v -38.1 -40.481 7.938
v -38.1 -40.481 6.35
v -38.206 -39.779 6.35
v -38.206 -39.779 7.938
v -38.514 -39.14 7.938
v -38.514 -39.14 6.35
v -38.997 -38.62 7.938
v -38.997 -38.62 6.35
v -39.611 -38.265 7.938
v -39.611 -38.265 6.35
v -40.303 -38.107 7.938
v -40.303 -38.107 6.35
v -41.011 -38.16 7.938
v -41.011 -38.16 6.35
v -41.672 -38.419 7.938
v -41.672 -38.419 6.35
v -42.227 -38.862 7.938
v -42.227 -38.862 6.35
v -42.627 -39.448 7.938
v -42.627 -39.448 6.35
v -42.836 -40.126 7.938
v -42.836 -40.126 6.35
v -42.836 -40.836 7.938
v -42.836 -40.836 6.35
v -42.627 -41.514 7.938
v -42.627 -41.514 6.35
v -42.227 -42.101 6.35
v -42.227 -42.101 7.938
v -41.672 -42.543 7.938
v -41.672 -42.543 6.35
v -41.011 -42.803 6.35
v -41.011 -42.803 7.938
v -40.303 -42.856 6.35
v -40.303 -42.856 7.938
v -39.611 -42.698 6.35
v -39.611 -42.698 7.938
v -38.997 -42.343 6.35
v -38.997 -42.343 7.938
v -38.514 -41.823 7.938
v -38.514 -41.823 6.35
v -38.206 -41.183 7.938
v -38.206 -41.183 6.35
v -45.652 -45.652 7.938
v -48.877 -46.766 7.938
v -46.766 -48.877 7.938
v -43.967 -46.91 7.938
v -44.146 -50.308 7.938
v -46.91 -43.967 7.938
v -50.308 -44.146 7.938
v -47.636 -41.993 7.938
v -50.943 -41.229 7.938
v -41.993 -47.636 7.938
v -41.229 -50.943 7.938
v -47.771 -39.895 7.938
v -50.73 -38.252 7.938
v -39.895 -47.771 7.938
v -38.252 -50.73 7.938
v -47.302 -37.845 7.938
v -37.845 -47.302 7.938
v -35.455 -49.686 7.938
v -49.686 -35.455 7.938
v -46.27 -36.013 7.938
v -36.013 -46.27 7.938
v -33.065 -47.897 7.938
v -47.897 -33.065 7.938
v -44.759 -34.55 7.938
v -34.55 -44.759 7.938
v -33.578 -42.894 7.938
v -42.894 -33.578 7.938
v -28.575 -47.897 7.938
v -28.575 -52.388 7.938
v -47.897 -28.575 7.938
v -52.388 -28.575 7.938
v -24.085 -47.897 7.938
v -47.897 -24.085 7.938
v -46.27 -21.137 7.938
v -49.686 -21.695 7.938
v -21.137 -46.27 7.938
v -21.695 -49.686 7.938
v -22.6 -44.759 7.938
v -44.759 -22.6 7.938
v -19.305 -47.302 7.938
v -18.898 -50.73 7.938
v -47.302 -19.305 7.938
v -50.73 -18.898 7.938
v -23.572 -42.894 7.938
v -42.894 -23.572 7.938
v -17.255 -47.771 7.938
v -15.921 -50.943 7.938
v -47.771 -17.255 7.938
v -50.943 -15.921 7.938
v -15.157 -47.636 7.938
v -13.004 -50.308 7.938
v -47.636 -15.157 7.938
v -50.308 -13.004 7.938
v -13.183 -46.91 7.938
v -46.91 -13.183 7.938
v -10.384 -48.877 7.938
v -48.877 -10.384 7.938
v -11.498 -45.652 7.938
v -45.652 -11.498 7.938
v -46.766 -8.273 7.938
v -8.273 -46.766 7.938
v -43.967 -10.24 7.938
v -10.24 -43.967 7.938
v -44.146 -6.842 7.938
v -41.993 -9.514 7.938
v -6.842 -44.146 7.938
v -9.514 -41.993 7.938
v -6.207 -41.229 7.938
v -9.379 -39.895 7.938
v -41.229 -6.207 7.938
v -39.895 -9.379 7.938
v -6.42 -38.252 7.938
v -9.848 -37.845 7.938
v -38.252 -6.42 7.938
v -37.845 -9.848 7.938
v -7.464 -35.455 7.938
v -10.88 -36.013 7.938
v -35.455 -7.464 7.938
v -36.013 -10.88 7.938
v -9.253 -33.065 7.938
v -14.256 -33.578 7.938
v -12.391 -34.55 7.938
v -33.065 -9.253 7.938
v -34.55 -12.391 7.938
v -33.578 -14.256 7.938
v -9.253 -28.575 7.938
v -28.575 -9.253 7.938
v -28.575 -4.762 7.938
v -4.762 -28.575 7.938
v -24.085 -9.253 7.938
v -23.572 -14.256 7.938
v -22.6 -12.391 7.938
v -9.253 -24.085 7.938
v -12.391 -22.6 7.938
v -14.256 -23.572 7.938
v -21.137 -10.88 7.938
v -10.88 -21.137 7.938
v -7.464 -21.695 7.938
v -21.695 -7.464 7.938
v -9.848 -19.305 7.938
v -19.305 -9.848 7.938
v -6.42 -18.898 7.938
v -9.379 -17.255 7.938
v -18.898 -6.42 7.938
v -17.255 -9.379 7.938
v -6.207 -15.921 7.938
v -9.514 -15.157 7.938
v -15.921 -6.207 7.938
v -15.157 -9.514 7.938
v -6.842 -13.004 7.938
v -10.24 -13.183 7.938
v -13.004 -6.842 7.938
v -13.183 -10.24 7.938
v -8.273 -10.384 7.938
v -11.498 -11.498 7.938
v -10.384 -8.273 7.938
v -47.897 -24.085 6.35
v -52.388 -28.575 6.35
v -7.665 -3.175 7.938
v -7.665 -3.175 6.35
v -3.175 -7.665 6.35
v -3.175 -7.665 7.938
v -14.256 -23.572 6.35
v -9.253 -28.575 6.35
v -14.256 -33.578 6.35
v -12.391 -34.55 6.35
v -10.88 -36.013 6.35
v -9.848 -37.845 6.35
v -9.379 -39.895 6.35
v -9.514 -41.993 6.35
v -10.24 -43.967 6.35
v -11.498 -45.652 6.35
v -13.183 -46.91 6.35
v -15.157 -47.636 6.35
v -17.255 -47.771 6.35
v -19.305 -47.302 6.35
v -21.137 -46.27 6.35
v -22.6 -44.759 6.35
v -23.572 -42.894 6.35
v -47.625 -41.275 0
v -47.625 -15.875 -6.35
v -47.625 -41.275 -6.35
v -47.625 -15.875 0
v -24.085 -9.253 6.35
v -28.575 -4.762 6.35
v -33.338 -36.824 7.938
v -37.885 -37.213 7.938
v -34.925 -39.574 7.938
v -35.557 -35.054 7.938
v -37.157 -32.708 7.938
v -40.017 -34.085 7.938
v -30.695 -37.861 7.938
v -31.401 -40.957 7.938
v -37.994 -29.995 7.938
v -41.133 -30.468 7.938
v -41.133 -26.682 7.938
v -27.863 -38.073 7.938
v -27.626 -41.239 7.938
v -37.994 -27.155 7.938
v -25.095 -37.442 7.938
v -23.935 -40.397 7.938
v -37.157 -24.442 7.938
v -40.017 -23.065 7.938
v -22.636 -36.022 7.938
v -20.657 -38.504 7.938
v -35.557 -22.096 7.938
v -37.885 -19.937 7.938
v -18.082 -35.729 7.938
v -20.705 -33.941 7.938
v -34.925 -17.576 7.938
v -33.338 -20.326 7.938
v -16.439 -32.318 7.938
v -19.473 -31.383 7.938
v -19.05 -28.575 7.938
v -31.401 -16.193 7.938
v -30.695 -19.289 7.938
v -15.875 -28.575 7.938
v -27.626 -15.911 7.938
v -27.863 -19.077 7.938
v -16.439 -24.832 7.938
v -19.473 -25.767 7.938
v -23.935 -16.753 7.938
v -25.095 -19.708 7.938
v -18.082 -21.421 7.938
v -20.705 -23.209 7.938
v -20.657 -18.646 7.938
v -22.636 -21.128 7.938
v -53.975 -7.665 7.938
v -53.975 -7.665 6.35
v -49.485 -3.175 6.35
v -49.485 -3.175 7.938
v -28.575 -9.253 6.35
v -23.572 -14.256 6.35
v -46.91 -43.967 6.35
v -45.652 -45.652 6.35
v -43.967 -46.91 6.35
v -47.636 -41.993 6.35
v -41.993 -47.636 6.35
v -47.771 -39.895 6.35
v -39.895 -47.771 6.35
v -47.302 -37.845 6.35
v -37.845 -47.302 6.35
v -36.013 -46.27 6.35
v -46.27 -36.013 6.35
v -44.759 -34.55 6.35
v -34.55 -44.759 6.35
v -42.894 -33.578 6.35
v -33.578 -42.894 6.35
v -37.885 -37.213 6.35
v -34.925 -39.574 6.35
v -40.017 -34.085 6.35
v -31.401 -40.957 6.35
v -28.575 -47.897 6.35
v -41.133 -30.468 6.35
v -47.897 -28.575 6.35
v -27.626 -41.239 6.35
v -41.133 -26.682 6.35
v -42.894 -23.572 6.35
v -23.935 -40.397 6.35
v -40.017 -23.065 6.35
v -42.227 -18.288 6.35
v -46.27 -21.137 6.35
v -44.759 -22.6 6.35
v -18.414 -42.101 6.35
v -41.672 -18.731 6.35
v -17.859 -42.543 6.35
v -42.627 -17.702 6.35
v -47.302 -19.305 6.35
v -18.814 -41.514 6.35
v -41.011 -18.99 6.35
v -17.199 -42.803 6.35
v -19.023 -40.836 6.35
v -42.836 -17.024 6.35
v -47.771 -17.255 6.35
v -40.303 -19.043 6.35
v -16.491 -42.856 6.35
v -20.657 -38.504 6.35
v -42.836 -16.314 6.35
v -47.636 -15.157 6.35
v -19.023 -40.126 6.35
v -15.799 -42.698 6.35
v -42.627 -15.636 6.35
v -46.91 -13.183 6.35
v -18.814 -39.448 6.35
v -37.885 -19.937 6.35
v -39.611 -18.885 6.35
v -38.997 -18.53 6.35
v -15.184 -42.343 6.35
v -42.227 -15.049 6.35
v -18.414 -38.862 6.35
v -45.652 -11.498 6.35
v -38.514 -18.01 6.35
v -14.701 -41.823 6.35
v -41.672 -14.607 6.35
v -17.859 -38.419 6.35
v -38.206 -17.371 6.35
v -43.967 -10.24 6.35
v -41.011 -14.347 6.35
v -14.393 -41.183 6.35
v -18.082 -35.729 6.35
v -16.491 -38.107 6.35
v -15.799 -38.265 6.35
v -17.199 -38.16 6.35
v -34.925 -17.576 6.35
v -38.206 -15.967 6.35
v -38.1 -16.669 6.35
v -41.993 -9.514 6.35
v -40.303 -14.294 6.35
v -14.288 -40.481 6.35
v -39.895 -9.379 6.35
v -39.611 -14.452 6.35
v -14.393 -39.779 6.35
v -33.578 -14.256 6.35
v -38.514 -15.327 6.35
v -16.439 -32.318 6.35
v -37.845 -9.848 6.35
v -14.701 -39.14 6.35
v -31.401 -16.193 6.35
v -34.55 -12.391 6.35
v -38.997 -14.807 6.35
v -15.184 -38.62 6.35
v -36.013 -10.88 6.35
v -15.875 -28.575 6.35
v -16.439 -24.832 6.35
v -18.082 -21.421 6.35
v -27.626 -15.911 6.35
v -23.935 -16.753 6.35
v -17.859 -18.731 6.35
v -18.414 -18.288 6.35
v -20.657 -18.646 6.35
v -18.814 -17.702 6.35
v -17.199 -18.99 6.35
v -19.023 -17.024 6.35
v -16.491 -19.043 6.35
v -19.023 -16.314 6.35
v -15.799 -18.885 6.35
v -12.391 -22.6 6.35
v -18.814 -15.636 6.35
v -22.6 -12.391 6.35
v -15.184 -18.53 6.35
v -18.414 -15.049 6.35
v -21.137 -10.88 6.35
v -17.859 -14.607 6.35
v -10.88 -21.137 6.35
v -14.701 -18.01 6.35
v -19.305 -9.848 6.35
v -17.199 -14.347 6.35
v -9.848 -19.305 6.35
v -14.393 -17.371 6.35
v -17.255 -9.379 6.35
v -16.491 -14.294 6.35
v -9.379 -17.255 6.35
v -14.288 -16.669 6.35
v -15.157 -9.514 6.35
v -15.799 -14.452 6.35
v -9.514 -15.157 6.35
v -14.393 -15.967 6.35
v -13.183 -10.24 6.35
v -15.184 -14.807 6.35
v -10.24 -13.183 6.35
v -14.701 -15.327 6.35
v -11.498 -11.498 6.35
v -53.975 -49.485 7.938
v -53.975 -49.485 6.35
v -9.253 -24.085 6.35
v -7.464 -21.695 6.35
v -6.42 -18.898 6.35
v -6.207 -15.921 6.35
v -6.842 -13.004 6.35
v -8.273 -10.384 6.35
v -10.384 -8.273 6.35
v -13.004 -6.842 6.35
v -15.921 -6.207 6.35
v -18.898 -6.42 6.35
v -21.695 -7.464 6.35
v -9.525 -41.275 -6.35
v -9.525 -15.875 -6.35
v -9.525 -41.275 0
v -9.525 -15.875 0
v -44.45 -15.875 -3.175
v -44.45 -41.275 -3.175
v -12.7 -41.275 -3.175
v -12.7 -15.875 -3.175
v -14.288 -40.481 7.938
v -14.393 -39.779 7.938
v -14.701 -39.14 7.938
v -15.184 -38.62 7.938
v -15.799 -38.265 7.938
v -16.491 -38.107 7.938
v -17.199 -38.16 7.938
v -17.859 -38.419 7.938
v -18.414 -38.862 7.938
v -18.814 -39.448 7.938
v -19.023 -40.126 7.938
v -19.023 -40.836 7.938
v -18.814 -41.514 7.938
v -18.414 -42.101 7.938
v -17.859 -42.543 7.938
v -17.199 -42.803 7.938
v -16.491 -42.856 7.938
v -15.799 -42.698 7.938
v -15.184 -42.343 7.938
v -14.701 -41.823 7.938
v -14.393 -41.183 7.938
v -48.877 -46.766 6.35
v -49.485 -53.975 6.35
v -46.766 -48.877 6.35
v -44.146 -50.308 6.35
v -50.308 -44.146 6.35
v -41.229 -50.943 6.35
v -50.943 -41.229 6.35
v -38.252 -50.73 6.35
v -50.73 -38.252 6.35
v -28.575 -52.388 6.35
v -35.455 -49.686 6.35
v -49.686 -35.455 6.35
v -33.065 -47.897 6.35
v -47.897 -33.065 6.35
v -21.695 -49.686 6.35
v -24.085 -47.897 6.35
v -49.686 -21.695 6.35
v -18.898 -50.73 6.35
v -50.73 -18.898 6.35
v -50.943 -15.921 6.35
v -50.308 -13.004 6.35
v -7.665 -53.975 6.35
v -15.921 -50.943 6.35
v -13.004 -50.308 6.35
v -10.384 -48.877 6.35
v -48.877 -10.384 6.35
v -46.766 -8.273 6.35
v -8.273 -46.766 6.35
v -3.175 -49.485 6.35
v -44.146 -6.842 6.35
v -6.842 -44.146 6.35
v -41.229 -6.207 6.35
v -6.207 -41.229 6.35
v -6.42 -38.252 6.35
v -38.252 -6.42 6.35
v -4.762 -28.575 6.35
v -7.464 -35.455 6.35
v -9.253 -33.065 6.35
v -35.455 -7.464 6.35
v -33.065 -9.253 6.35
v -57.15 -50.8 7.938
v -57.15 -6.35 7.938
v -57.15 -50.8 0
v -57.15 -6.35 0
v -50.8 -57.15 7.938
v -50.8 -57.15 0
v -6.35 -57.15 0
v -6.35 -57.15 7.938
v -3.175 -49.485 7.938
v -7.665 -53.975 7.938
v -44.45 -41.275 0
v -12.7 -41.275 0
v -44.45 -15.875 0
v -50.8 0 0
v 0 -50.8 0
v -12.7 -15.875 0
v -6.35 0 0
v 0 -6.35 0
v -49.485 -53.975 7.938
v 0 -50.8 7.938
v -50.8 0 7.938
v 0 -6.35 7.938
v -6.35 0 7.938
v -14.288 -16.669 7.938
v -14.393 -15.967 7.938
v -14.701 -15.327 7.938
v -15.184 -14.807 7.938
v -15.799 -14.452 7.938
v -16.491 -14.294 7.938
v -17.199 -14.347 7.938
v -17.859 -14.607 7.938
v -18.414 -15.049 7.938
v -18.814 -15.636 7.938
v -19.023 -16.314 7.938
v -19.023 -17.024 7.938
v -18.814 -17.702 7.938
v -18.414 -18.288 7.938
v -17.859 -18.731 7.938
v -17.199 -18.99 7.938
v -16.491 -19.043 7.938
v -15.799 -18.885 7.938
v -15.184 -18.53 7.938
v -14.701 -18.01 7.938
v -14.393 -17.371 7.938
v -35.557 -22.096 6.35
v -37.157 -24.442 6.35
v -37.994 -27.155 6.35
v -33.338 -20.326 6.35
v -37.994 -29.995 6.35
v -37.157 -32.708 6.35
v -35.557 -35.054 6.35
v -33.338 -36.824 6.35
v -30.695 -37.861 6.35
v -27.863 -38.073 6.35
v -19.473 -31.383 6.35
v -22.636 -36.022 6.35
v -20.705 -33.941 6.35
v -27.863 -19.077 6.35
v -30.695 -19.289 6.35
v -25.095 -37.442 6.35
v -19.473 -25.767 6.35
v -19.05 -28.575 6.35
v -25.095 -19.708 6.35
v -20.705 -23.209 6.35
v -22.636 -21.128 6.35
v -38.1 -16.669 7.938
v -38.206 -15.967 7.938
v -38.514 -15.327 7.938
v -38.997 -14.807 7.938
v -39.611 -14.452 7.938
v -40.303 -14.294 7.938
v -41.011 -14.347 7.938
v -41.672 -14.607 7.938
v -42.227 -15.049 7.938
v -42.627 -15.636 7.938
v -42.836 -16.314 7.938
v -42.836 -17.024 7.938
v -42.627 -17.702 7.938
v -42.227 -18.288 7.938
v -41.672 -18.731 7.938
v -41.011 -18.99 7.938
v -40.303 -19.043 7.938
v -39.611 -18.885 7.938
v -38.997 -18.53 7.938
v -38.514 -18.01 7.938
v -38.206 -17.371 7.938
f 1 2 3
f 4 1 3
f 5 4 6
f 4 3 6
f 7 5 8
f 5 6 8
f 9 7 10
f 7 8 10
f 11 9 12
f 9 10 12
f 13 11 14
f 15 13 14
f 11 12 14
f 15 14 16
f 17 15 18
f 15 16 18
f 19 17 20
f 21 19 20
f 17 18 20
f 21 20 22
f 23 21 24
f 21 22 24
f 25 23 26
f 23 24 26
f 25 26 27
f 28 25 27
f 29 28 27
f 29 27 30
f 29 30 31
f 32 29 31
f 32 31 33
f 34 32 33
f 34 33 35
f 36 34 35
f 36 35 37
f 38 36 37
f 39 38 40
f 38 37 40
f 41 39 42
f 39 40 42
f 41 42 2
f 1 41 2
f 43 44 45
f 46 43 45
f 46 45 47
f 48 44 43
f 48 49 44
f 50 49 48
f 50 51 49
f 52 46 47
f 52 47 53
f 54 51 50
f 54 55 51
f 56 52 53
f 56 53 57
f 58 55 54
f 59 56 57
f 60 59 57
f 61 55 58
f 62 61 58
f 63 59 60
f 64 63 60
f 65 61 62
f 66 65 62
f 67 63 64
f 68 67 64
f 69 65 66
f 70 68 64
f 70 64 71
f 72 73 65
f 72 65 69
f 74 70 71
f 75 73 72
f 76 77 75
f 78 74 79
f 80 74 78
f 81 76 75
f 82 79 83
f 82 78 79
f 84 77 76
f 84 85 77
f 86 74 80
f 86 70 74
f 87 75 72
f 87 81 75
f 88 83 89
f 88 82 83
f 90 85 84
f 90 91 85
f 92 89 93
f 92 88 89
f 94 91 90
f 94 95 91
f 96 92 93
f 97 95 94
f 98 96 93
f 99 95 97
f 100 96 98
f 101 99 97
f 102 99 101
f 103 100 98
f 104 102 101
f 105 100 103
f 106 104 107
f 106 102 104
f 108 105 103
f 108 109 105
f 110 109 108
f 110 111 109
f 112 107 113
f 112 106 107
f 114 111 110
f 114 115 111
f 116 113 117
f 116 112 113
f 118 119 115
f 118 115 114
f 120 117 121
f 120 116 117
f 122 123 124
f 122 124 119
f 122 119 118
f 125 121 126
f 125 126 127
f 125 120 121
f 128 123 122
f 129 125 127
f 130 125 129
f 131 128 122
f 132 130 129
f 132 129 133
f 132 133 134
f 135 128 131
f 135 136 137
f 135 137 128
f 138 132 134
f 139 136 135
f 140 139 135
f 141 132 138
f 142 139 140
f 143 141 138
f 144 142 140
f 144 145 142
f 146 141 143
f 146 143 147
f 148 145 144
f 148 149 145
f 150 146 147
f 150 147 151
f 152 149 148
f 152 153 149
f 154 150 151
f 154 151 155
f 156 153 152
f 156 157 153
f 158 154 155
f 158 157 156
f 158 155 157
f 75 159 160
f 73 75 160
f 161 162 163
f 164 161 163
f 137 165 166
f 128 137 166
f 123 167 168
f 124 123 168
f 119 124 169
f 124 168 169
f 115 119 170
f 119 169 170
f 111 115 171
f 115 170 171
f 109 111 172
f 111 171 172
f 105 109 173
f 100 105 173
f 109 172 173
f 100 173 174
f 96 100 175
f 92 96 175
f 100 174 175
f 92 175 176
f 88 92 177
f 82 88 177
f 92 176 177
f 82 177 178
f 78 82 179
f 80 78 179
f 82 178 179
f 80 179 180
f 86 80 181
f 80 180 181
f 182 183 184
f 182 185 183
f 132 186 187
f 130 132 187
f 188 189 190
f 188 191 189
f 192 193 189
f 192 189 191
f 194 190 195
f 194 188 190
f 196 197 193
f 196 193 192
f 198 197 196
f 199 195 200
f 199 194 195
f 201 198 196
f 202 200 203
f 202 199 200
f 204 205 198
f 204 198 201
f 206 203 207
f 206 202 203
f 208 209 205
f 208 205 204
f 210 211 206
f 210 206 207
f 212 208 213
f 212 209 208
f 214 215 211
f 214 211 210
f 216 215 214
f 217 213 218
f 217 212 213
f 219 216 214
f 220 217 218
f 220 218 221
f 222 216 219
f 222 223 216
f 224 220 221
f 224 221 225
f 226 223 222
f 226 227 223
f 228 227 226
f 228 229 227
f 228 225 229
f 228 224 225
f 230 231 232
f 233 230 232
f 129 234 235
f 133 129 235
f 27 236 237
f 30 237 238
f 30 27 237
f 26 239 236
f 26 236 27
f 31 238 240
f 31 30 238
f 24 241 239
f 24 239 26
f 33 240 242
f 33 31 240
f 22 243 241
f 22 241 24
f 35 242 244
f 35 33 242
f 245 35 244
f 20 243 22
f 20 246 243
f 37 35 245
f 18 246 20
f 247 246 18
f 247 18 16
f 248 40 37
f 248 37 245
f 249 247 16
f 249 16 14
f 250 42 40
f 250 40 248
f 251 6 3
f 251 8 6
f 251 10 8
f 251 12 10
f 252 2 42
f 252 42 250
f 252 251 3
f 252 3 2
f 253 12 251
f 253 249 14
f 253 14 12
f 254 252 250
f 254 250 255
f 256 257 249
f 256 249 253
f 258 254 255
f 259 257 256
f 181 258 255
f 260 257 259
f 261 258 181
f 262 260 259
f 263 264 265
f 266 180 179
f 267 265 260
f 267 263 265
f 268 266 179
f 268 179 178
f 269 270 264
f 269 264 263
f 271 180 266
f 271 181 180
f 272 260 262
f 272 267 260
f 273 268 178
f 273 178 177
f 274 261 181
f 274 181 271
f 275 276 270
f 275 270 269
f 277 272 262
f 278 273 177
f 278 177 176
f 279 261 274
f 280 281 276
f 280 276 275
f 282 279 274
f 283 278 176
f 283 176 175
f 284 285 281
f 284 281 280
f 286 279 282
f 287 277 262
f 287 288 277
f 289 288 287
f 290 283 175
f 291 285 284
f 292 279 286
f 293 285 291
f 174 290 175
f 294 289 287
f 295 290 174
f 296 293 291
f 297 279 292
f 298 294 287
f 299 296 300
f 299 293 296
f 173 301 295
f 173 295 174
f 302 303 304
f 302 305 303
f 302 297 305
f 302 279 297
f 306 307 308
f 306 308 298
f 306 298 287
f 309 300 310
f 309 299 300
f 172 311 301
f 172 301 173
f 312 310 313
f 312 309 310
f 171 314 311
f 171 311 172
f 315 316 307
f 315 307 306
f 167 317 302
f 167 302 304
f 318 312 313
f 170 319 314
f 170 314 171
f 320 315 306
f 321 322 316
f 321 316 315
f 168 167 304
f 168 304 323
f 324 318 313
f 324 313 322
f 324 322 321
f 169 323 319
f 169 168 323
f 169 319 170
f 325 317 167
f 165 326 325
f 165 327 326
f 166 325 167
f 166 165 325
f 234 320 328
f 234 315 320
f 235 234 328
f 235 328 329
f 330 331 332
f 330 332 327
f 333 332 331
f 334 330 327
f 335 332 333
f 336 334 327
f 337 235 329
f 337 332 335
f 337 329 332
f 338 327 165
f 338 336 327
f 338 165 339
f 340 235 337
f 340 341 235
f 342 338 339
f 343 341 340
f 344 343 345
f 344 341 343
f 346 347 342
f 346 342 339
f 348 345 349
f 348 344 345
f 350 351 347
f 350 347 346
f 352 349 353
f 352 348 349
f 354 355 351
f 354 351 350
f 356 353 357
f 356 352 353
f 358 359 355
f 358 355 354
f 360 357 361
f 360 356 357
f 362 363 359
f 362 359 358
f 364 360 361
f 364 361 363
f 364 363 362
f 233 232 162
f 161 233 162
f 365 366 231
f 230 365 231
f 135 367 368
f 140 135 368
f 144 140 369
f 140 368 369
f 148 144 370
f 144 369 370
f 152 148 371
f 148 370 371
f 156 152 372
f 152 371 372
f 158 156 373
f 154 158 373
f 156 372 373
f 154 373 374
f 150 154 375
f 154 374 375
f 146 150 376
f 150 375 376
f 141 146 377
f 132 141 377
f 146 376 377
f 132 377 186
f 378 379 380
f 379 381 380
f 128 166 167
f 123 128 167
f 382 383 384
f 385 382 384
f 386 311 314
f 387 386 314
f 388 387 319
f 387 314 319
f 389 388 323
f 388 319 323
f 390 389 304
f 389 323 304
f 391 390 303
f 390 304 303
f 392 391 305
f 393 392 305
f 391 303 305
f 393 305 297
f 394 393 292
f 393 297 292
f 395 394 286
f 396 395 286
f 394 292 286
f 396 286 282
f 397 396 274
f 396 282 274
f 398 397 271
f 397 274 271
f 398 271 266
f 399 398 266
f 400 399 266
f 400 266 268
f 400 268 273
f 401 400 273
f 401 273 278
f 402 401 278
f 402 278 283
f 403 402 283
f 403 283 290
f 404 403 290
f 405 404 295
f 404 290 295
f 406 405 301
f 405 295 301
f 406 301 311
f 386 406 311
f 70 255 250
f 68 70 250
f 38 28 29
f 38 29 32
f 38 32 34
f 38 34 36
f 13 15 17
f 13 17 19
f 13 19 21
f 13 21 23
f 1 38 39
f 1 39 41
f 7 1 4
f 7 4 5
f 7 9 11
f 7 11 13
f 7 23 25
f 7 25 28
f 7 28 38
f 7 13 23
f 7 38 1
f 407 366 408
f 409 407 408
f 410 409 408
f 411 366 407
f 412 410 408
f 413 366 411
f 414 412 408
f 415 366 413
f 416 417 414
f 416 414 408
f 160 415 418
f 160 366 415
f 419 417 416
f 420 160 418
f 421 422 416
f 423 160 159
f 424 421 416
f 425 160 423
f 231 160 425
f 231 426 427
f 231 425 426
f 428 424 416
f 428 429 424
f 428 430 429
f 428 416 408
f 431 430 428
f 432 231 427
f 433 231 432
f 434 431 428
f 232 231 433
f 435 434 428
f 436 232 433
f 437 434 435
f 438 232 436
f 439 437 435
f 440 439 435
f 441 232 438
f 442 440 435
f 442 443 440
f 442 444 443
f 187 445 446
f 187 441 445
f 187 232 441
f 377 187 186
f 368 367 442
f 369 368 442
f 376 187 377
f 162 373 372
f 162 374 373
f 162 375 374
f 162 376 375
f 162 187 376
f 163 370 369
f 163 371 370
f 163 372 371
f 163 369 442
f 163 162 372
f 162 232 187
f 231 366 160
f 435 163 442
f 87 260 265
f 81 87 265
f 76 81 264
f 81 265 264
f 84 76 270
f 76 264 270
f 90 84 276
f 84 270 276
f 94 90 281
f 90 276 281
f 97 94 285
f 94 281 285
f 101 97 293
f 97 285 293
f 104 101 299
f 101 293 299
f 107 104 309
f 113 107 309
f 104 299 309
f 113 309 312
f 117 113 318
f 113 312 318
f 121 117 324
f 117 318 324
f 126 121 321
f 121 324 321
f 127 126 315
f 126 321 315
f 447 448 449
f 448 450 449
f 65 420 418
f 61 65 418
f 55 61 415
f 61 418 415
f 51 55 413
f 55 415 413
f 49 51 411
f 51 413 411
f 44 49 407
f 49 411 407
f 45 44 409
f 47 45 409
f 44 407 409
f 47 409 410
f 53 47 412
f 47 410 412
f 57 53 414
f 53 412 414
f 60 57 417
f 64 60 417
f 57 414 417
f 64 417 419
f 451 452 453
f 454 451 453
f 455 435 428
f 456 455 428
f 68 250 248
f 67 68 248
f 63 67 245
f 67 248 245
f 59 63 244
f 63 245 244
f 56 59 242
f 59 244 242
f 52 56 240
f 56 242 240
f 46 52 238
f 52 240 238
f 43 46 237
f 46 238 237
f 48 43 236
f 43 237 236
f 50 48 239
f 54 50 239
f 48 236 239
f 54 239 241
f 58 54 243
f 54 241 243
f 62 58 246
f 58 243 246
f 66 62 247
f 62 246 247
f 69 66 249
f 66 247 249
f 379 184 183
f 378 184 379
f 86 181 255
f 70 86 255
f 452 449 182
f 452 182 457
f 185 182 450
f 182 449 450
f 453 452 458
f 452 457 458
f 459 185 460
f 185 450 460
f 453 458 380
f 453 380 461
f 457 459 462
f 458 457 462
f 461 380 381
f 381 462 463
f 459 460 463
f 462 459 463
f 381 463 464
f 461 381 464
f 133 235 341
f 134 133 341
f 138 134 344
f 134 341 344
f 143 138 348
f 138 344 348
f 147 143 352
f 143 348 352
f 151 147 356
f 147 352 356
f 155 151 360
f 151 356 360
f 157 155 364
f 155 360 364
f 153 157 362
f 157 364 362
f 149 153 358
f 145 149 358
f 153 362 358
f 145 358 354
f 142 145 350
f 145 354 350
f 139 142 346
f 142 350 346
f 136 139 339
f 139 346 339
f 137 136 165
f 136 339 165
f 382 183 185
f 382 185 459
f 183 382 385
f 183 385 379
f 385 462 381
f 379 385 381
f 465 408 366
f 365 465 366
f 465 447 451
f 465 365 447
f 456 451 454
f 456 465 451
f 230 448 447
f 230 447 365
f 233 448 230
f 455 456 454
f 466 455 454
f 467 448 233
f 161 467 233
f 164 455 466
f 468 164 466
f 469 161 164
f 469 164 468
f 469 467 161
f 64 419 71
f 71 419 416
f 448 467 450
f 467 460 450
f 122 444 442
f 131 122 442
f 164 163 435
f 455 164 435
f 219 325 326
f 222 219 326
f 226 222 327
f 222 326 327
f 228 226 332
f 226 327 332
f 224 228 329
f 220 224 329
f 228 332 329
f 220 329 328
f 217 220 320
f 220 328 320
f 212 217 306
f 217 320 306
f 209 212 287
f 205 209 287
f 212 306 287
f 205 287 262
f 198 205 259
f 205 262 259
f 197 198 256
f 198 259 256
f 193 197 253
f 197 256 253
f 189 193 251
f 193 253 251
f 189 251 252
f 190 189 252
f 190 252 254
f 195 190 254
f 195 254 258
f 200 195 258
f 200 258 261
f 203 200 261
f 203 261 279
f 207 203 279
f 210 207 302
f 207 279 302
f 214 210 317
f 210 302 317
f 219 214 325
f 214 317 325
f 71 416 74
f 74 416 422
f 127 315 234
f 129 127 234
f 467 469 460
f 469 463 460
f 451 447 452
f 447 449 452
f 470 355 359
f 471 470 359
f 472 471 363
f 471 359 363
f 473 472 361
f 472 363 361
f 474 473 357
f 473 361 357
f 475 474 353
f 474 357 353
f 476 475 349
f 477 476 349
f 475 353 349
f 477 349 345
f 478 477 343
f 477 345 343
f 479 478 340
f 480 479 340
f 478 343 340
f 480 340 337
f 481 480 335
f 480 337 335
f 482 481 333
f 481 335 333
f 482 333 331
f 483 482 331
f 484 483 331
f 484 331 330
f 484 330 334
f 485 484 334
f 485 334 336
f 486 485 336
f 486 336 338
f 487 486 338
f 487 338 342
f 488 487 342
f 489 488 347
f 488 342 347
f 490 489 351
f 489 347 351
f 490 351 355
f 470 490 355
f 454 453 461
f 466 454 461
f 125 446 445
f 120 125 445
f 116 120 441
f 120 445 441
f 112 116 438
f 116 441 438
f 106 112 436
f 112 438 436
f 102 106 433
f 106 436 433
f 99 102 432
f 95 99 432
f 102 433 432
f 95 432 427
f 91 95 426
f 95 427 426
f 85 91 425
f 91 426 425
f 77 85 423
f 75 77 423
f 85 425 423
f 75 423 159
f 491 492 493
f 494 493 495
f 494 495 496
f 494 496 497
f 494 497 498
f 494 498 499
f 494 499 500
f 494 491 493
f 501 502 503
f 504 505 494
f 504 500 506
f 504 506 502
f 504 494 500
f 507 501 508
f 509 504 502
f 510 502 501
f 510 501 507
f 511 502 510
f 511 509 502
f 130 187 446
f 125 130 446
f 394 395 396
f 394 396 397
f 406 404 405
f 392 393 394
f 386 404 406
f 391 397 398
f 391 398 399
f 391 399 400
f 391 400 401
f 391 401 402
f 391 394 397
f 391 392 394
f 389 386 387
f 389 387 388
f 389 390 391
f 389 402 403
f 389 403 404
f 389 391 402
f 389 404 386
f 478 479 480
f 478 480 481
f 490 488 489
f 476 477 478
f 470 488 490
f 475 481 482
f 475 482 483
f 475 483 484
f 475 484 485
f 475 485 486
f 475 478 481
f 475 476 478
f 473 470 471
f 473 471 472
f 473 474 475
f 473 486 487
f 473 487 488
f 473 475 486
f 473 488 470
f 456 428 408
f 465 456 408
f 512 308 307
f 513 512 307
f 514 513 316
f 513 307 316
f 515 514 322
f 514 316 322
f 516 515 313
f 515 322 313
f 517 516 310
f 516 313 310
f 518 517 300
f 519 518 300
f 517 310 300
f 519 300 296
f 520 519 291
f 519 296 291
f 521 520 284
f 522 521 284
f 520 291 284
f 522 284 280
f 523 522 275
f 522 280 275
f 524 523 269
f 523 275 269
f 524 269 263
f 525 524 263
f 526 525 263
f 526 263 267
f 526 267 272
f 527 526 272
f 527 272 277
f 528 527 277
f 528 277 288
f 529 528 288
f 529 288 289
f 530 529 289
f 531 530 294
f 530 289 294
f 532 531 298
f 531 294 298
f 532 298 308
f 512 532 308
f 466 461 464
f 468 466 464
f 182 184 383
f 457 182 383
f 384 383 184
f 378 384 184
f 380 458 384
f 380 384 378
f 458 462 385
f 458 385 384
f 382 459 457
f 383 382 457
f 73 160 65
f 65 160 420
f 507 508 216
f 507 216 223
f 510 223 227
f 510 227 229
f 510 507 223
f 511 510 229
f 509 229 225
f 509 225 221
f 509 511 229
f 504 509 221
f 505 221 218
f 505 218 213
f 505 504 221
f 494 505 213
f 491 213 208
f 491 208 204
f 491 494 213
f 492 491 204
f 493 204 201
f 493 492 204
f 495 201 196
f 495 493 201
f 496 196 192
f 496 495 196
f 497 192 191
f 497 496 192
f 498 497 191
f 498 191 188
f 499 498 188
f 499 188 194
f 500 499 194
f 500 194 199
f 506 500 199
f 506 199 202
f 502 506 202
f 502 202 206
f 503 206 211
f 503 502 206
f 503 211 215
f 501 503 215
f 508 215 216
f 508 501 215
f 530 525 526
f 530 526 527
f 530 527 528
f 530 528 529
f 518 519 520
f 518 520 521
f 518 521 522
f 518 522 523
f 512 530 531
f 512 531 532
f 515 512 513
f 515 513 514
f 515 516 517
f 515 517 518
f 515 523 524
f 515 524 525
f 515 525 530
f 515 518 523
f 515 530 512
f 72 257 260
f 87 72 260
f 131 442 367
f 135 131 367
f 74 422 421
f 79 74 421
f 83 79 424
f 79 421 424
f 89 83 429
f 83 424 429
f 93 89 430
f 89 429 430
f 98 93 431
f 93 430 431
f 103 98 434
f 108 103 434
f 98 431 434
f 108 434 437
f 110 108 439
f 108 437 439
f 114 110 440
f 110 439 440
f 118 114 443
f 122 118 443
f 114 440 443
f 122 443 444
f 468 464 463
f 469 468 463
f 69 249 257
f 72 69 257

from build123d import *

# Parameters (mm, degrees)
F1_DEPTH = 6.35
F2_R     = 12.7
F2_R_2   = 9.525
F2_R_3   = 2.38125
F3_DEPTH = 1.5875
F4_W     = 3.175
F4_H     = 25.4
F5_DEPTH = 3.175
F6_W     = 38.1
F6_H     = 25.4
F7_DEPTH = 3.175


with BuildPart() as f1:
    # F0 (on Top) → F1 (new body)
    with BuildSketch(Plane.XY):
        Polygon((-6.35, 0), (-50.8, 0), (-57.15, -6.35), (-57.15, -50.8), (-50.8, -57.15), (-6.35, -57.15), (0, -50.8), (0, -6.35), align=None)
    extrude(amount=F1_DEPTH)

    # F2 (on face) → F3 (join)
    with BuildSketch(Plane.XY.offset(6.35)):
        Polygon((0, -6.35), (-6.35, 0), (-50.8, 0), (-57.15, -6.35), (-57.15, -50.8), (-50.8, -57.15), (-6.35, -57.15), (0, -50.8), align=None)
        Polygon((-3.175, -7.665128), (-3.175, -49.484872), (-7.665128, -53.975), (-49.484872, -53.975), (-53.975, -49.484872), (-53.975, -7.665128), (-49.484872, -3.175), (-7.665128, -3.175), align=None, mode=Mode.SUBTRACT)
        with BuildLine():
            Line((-28.575, -52.3875), (-24.084872, -47.897372))
            ThreePointArc((-24.084872, -47.897372), (-9.252628, -47.897372), (-9.252628, -33.065128))
            Line((-9.252628, -33.065128), (-4.7625, -28.575))
            Line((-4.7625, -28.575), (-9.252628, -24.084872))
            ThreePointArc((-9.252628, -24.084872), (-9.252628, -9.252628), (-24.084872, -9.252628))
            Line((-24.084872, -9.252628), (-28.575, -4.7625))
            Line((-28.575, -4.7625), (-33.065128, -9.252628))
            ThreePointArc((-33.065128, -9.252628), (-47.897372, -9.252628), (-47.897372, -24.084872))
            Line((-47.897372, -24.084872), (-52.3875, -28.575))
            Line((-52.3875, -28.575), (-47.897372, -33.065128))
            ThreePointArc((-47.897372, -33.065128), (-47.897372, -47.897372), (-33.065128, -47.897372))
            Line((-33.065128, -47.897372), (-28.575, -52.3875))
        make_face()
        with BuildLine():
            ThreePointArc((-23.572089, -14.255539), (-11.497692, -11.497692), (-14.255539, -23.572089))
            Line((-14.255539, -23.572089), (-9.252628, -28.575))
            Line((-9.252628, -28.575), (-14.255539, -33.577911))
            ThreePointArc((-14.255539, -33.577911), (-11.497692, -45.652308), (-23.572089, -42.894461))
            Line((-23.572089, -42.894461), (-28.575, -47.897372))
            Line((-28.575, -47.897372), (-33.577911, -42.894461))
            ThreePointArc((-33.577911, -42.894461), (-45.652308, -45.652308), (-42.894461, -33.577911))
            Line((-42.894461, -33.577911), (-47.897372, -28.575))
            Line((-47.897372, -28.575), (-42.894461, -23.572089))
            ThreePointArc((-42.894461, -23.572089), (-45.652308, -11.497692), (-33.577911, -14.255539))
            Line((-33.577911, -14.255539), (-28.575, -9.252628))
            Line((-28.575, -9.252628), (-23.572089, -14.255539))
        make_face(mode=Mode.SUBTRACT)
        with Locations((-28.575, -28.575)):
            Circle(F2_R)
        with Locations((-28.575, -28.575)):
            Circle(F2_R_2, mode=Mode.SUBTRACT)
        with Locations((-40.48125, -40.48125)):
            Circle(F2_R_3)
        with Locations((-16.66875, -40.48125)):
            Circle(F2_R_3)
        with Locations((-16.66875, -16.66875)):
            Circle(F2_R_3)
        with Locations((-40.48125, -16.66875)):
            Circle(F2_R_3)
    extrude(amount=F3_DEPTH)

    # F4 (on face) → F5 (join)
    with BuildSketch(Plane(origin=(0, 0, 0), x_dir=(1, 0, 0), z_dir=(0, 0, -1))):
        with Locations((-46.0375, 28.575)):
            Rectangle(F4_W, F4_H)
        with Locations((-11.1125, 28.575)):
            Rectangle(F4_W, F4_H)
    extrude(amount=F5_DEPTH)

    # F6 (on face) → F7 (join)
    with BuildSketch(Plane(origin=(0, 0, -3.175), x_dir=(1, 0, 0), z_dir=(0, 0, -1))):
        with Locations((-28.575, 28.575)):
            Rectangle(F6_W, F6_H)
    extrude(amount=F7_DEPTH)


solid = f1.part
